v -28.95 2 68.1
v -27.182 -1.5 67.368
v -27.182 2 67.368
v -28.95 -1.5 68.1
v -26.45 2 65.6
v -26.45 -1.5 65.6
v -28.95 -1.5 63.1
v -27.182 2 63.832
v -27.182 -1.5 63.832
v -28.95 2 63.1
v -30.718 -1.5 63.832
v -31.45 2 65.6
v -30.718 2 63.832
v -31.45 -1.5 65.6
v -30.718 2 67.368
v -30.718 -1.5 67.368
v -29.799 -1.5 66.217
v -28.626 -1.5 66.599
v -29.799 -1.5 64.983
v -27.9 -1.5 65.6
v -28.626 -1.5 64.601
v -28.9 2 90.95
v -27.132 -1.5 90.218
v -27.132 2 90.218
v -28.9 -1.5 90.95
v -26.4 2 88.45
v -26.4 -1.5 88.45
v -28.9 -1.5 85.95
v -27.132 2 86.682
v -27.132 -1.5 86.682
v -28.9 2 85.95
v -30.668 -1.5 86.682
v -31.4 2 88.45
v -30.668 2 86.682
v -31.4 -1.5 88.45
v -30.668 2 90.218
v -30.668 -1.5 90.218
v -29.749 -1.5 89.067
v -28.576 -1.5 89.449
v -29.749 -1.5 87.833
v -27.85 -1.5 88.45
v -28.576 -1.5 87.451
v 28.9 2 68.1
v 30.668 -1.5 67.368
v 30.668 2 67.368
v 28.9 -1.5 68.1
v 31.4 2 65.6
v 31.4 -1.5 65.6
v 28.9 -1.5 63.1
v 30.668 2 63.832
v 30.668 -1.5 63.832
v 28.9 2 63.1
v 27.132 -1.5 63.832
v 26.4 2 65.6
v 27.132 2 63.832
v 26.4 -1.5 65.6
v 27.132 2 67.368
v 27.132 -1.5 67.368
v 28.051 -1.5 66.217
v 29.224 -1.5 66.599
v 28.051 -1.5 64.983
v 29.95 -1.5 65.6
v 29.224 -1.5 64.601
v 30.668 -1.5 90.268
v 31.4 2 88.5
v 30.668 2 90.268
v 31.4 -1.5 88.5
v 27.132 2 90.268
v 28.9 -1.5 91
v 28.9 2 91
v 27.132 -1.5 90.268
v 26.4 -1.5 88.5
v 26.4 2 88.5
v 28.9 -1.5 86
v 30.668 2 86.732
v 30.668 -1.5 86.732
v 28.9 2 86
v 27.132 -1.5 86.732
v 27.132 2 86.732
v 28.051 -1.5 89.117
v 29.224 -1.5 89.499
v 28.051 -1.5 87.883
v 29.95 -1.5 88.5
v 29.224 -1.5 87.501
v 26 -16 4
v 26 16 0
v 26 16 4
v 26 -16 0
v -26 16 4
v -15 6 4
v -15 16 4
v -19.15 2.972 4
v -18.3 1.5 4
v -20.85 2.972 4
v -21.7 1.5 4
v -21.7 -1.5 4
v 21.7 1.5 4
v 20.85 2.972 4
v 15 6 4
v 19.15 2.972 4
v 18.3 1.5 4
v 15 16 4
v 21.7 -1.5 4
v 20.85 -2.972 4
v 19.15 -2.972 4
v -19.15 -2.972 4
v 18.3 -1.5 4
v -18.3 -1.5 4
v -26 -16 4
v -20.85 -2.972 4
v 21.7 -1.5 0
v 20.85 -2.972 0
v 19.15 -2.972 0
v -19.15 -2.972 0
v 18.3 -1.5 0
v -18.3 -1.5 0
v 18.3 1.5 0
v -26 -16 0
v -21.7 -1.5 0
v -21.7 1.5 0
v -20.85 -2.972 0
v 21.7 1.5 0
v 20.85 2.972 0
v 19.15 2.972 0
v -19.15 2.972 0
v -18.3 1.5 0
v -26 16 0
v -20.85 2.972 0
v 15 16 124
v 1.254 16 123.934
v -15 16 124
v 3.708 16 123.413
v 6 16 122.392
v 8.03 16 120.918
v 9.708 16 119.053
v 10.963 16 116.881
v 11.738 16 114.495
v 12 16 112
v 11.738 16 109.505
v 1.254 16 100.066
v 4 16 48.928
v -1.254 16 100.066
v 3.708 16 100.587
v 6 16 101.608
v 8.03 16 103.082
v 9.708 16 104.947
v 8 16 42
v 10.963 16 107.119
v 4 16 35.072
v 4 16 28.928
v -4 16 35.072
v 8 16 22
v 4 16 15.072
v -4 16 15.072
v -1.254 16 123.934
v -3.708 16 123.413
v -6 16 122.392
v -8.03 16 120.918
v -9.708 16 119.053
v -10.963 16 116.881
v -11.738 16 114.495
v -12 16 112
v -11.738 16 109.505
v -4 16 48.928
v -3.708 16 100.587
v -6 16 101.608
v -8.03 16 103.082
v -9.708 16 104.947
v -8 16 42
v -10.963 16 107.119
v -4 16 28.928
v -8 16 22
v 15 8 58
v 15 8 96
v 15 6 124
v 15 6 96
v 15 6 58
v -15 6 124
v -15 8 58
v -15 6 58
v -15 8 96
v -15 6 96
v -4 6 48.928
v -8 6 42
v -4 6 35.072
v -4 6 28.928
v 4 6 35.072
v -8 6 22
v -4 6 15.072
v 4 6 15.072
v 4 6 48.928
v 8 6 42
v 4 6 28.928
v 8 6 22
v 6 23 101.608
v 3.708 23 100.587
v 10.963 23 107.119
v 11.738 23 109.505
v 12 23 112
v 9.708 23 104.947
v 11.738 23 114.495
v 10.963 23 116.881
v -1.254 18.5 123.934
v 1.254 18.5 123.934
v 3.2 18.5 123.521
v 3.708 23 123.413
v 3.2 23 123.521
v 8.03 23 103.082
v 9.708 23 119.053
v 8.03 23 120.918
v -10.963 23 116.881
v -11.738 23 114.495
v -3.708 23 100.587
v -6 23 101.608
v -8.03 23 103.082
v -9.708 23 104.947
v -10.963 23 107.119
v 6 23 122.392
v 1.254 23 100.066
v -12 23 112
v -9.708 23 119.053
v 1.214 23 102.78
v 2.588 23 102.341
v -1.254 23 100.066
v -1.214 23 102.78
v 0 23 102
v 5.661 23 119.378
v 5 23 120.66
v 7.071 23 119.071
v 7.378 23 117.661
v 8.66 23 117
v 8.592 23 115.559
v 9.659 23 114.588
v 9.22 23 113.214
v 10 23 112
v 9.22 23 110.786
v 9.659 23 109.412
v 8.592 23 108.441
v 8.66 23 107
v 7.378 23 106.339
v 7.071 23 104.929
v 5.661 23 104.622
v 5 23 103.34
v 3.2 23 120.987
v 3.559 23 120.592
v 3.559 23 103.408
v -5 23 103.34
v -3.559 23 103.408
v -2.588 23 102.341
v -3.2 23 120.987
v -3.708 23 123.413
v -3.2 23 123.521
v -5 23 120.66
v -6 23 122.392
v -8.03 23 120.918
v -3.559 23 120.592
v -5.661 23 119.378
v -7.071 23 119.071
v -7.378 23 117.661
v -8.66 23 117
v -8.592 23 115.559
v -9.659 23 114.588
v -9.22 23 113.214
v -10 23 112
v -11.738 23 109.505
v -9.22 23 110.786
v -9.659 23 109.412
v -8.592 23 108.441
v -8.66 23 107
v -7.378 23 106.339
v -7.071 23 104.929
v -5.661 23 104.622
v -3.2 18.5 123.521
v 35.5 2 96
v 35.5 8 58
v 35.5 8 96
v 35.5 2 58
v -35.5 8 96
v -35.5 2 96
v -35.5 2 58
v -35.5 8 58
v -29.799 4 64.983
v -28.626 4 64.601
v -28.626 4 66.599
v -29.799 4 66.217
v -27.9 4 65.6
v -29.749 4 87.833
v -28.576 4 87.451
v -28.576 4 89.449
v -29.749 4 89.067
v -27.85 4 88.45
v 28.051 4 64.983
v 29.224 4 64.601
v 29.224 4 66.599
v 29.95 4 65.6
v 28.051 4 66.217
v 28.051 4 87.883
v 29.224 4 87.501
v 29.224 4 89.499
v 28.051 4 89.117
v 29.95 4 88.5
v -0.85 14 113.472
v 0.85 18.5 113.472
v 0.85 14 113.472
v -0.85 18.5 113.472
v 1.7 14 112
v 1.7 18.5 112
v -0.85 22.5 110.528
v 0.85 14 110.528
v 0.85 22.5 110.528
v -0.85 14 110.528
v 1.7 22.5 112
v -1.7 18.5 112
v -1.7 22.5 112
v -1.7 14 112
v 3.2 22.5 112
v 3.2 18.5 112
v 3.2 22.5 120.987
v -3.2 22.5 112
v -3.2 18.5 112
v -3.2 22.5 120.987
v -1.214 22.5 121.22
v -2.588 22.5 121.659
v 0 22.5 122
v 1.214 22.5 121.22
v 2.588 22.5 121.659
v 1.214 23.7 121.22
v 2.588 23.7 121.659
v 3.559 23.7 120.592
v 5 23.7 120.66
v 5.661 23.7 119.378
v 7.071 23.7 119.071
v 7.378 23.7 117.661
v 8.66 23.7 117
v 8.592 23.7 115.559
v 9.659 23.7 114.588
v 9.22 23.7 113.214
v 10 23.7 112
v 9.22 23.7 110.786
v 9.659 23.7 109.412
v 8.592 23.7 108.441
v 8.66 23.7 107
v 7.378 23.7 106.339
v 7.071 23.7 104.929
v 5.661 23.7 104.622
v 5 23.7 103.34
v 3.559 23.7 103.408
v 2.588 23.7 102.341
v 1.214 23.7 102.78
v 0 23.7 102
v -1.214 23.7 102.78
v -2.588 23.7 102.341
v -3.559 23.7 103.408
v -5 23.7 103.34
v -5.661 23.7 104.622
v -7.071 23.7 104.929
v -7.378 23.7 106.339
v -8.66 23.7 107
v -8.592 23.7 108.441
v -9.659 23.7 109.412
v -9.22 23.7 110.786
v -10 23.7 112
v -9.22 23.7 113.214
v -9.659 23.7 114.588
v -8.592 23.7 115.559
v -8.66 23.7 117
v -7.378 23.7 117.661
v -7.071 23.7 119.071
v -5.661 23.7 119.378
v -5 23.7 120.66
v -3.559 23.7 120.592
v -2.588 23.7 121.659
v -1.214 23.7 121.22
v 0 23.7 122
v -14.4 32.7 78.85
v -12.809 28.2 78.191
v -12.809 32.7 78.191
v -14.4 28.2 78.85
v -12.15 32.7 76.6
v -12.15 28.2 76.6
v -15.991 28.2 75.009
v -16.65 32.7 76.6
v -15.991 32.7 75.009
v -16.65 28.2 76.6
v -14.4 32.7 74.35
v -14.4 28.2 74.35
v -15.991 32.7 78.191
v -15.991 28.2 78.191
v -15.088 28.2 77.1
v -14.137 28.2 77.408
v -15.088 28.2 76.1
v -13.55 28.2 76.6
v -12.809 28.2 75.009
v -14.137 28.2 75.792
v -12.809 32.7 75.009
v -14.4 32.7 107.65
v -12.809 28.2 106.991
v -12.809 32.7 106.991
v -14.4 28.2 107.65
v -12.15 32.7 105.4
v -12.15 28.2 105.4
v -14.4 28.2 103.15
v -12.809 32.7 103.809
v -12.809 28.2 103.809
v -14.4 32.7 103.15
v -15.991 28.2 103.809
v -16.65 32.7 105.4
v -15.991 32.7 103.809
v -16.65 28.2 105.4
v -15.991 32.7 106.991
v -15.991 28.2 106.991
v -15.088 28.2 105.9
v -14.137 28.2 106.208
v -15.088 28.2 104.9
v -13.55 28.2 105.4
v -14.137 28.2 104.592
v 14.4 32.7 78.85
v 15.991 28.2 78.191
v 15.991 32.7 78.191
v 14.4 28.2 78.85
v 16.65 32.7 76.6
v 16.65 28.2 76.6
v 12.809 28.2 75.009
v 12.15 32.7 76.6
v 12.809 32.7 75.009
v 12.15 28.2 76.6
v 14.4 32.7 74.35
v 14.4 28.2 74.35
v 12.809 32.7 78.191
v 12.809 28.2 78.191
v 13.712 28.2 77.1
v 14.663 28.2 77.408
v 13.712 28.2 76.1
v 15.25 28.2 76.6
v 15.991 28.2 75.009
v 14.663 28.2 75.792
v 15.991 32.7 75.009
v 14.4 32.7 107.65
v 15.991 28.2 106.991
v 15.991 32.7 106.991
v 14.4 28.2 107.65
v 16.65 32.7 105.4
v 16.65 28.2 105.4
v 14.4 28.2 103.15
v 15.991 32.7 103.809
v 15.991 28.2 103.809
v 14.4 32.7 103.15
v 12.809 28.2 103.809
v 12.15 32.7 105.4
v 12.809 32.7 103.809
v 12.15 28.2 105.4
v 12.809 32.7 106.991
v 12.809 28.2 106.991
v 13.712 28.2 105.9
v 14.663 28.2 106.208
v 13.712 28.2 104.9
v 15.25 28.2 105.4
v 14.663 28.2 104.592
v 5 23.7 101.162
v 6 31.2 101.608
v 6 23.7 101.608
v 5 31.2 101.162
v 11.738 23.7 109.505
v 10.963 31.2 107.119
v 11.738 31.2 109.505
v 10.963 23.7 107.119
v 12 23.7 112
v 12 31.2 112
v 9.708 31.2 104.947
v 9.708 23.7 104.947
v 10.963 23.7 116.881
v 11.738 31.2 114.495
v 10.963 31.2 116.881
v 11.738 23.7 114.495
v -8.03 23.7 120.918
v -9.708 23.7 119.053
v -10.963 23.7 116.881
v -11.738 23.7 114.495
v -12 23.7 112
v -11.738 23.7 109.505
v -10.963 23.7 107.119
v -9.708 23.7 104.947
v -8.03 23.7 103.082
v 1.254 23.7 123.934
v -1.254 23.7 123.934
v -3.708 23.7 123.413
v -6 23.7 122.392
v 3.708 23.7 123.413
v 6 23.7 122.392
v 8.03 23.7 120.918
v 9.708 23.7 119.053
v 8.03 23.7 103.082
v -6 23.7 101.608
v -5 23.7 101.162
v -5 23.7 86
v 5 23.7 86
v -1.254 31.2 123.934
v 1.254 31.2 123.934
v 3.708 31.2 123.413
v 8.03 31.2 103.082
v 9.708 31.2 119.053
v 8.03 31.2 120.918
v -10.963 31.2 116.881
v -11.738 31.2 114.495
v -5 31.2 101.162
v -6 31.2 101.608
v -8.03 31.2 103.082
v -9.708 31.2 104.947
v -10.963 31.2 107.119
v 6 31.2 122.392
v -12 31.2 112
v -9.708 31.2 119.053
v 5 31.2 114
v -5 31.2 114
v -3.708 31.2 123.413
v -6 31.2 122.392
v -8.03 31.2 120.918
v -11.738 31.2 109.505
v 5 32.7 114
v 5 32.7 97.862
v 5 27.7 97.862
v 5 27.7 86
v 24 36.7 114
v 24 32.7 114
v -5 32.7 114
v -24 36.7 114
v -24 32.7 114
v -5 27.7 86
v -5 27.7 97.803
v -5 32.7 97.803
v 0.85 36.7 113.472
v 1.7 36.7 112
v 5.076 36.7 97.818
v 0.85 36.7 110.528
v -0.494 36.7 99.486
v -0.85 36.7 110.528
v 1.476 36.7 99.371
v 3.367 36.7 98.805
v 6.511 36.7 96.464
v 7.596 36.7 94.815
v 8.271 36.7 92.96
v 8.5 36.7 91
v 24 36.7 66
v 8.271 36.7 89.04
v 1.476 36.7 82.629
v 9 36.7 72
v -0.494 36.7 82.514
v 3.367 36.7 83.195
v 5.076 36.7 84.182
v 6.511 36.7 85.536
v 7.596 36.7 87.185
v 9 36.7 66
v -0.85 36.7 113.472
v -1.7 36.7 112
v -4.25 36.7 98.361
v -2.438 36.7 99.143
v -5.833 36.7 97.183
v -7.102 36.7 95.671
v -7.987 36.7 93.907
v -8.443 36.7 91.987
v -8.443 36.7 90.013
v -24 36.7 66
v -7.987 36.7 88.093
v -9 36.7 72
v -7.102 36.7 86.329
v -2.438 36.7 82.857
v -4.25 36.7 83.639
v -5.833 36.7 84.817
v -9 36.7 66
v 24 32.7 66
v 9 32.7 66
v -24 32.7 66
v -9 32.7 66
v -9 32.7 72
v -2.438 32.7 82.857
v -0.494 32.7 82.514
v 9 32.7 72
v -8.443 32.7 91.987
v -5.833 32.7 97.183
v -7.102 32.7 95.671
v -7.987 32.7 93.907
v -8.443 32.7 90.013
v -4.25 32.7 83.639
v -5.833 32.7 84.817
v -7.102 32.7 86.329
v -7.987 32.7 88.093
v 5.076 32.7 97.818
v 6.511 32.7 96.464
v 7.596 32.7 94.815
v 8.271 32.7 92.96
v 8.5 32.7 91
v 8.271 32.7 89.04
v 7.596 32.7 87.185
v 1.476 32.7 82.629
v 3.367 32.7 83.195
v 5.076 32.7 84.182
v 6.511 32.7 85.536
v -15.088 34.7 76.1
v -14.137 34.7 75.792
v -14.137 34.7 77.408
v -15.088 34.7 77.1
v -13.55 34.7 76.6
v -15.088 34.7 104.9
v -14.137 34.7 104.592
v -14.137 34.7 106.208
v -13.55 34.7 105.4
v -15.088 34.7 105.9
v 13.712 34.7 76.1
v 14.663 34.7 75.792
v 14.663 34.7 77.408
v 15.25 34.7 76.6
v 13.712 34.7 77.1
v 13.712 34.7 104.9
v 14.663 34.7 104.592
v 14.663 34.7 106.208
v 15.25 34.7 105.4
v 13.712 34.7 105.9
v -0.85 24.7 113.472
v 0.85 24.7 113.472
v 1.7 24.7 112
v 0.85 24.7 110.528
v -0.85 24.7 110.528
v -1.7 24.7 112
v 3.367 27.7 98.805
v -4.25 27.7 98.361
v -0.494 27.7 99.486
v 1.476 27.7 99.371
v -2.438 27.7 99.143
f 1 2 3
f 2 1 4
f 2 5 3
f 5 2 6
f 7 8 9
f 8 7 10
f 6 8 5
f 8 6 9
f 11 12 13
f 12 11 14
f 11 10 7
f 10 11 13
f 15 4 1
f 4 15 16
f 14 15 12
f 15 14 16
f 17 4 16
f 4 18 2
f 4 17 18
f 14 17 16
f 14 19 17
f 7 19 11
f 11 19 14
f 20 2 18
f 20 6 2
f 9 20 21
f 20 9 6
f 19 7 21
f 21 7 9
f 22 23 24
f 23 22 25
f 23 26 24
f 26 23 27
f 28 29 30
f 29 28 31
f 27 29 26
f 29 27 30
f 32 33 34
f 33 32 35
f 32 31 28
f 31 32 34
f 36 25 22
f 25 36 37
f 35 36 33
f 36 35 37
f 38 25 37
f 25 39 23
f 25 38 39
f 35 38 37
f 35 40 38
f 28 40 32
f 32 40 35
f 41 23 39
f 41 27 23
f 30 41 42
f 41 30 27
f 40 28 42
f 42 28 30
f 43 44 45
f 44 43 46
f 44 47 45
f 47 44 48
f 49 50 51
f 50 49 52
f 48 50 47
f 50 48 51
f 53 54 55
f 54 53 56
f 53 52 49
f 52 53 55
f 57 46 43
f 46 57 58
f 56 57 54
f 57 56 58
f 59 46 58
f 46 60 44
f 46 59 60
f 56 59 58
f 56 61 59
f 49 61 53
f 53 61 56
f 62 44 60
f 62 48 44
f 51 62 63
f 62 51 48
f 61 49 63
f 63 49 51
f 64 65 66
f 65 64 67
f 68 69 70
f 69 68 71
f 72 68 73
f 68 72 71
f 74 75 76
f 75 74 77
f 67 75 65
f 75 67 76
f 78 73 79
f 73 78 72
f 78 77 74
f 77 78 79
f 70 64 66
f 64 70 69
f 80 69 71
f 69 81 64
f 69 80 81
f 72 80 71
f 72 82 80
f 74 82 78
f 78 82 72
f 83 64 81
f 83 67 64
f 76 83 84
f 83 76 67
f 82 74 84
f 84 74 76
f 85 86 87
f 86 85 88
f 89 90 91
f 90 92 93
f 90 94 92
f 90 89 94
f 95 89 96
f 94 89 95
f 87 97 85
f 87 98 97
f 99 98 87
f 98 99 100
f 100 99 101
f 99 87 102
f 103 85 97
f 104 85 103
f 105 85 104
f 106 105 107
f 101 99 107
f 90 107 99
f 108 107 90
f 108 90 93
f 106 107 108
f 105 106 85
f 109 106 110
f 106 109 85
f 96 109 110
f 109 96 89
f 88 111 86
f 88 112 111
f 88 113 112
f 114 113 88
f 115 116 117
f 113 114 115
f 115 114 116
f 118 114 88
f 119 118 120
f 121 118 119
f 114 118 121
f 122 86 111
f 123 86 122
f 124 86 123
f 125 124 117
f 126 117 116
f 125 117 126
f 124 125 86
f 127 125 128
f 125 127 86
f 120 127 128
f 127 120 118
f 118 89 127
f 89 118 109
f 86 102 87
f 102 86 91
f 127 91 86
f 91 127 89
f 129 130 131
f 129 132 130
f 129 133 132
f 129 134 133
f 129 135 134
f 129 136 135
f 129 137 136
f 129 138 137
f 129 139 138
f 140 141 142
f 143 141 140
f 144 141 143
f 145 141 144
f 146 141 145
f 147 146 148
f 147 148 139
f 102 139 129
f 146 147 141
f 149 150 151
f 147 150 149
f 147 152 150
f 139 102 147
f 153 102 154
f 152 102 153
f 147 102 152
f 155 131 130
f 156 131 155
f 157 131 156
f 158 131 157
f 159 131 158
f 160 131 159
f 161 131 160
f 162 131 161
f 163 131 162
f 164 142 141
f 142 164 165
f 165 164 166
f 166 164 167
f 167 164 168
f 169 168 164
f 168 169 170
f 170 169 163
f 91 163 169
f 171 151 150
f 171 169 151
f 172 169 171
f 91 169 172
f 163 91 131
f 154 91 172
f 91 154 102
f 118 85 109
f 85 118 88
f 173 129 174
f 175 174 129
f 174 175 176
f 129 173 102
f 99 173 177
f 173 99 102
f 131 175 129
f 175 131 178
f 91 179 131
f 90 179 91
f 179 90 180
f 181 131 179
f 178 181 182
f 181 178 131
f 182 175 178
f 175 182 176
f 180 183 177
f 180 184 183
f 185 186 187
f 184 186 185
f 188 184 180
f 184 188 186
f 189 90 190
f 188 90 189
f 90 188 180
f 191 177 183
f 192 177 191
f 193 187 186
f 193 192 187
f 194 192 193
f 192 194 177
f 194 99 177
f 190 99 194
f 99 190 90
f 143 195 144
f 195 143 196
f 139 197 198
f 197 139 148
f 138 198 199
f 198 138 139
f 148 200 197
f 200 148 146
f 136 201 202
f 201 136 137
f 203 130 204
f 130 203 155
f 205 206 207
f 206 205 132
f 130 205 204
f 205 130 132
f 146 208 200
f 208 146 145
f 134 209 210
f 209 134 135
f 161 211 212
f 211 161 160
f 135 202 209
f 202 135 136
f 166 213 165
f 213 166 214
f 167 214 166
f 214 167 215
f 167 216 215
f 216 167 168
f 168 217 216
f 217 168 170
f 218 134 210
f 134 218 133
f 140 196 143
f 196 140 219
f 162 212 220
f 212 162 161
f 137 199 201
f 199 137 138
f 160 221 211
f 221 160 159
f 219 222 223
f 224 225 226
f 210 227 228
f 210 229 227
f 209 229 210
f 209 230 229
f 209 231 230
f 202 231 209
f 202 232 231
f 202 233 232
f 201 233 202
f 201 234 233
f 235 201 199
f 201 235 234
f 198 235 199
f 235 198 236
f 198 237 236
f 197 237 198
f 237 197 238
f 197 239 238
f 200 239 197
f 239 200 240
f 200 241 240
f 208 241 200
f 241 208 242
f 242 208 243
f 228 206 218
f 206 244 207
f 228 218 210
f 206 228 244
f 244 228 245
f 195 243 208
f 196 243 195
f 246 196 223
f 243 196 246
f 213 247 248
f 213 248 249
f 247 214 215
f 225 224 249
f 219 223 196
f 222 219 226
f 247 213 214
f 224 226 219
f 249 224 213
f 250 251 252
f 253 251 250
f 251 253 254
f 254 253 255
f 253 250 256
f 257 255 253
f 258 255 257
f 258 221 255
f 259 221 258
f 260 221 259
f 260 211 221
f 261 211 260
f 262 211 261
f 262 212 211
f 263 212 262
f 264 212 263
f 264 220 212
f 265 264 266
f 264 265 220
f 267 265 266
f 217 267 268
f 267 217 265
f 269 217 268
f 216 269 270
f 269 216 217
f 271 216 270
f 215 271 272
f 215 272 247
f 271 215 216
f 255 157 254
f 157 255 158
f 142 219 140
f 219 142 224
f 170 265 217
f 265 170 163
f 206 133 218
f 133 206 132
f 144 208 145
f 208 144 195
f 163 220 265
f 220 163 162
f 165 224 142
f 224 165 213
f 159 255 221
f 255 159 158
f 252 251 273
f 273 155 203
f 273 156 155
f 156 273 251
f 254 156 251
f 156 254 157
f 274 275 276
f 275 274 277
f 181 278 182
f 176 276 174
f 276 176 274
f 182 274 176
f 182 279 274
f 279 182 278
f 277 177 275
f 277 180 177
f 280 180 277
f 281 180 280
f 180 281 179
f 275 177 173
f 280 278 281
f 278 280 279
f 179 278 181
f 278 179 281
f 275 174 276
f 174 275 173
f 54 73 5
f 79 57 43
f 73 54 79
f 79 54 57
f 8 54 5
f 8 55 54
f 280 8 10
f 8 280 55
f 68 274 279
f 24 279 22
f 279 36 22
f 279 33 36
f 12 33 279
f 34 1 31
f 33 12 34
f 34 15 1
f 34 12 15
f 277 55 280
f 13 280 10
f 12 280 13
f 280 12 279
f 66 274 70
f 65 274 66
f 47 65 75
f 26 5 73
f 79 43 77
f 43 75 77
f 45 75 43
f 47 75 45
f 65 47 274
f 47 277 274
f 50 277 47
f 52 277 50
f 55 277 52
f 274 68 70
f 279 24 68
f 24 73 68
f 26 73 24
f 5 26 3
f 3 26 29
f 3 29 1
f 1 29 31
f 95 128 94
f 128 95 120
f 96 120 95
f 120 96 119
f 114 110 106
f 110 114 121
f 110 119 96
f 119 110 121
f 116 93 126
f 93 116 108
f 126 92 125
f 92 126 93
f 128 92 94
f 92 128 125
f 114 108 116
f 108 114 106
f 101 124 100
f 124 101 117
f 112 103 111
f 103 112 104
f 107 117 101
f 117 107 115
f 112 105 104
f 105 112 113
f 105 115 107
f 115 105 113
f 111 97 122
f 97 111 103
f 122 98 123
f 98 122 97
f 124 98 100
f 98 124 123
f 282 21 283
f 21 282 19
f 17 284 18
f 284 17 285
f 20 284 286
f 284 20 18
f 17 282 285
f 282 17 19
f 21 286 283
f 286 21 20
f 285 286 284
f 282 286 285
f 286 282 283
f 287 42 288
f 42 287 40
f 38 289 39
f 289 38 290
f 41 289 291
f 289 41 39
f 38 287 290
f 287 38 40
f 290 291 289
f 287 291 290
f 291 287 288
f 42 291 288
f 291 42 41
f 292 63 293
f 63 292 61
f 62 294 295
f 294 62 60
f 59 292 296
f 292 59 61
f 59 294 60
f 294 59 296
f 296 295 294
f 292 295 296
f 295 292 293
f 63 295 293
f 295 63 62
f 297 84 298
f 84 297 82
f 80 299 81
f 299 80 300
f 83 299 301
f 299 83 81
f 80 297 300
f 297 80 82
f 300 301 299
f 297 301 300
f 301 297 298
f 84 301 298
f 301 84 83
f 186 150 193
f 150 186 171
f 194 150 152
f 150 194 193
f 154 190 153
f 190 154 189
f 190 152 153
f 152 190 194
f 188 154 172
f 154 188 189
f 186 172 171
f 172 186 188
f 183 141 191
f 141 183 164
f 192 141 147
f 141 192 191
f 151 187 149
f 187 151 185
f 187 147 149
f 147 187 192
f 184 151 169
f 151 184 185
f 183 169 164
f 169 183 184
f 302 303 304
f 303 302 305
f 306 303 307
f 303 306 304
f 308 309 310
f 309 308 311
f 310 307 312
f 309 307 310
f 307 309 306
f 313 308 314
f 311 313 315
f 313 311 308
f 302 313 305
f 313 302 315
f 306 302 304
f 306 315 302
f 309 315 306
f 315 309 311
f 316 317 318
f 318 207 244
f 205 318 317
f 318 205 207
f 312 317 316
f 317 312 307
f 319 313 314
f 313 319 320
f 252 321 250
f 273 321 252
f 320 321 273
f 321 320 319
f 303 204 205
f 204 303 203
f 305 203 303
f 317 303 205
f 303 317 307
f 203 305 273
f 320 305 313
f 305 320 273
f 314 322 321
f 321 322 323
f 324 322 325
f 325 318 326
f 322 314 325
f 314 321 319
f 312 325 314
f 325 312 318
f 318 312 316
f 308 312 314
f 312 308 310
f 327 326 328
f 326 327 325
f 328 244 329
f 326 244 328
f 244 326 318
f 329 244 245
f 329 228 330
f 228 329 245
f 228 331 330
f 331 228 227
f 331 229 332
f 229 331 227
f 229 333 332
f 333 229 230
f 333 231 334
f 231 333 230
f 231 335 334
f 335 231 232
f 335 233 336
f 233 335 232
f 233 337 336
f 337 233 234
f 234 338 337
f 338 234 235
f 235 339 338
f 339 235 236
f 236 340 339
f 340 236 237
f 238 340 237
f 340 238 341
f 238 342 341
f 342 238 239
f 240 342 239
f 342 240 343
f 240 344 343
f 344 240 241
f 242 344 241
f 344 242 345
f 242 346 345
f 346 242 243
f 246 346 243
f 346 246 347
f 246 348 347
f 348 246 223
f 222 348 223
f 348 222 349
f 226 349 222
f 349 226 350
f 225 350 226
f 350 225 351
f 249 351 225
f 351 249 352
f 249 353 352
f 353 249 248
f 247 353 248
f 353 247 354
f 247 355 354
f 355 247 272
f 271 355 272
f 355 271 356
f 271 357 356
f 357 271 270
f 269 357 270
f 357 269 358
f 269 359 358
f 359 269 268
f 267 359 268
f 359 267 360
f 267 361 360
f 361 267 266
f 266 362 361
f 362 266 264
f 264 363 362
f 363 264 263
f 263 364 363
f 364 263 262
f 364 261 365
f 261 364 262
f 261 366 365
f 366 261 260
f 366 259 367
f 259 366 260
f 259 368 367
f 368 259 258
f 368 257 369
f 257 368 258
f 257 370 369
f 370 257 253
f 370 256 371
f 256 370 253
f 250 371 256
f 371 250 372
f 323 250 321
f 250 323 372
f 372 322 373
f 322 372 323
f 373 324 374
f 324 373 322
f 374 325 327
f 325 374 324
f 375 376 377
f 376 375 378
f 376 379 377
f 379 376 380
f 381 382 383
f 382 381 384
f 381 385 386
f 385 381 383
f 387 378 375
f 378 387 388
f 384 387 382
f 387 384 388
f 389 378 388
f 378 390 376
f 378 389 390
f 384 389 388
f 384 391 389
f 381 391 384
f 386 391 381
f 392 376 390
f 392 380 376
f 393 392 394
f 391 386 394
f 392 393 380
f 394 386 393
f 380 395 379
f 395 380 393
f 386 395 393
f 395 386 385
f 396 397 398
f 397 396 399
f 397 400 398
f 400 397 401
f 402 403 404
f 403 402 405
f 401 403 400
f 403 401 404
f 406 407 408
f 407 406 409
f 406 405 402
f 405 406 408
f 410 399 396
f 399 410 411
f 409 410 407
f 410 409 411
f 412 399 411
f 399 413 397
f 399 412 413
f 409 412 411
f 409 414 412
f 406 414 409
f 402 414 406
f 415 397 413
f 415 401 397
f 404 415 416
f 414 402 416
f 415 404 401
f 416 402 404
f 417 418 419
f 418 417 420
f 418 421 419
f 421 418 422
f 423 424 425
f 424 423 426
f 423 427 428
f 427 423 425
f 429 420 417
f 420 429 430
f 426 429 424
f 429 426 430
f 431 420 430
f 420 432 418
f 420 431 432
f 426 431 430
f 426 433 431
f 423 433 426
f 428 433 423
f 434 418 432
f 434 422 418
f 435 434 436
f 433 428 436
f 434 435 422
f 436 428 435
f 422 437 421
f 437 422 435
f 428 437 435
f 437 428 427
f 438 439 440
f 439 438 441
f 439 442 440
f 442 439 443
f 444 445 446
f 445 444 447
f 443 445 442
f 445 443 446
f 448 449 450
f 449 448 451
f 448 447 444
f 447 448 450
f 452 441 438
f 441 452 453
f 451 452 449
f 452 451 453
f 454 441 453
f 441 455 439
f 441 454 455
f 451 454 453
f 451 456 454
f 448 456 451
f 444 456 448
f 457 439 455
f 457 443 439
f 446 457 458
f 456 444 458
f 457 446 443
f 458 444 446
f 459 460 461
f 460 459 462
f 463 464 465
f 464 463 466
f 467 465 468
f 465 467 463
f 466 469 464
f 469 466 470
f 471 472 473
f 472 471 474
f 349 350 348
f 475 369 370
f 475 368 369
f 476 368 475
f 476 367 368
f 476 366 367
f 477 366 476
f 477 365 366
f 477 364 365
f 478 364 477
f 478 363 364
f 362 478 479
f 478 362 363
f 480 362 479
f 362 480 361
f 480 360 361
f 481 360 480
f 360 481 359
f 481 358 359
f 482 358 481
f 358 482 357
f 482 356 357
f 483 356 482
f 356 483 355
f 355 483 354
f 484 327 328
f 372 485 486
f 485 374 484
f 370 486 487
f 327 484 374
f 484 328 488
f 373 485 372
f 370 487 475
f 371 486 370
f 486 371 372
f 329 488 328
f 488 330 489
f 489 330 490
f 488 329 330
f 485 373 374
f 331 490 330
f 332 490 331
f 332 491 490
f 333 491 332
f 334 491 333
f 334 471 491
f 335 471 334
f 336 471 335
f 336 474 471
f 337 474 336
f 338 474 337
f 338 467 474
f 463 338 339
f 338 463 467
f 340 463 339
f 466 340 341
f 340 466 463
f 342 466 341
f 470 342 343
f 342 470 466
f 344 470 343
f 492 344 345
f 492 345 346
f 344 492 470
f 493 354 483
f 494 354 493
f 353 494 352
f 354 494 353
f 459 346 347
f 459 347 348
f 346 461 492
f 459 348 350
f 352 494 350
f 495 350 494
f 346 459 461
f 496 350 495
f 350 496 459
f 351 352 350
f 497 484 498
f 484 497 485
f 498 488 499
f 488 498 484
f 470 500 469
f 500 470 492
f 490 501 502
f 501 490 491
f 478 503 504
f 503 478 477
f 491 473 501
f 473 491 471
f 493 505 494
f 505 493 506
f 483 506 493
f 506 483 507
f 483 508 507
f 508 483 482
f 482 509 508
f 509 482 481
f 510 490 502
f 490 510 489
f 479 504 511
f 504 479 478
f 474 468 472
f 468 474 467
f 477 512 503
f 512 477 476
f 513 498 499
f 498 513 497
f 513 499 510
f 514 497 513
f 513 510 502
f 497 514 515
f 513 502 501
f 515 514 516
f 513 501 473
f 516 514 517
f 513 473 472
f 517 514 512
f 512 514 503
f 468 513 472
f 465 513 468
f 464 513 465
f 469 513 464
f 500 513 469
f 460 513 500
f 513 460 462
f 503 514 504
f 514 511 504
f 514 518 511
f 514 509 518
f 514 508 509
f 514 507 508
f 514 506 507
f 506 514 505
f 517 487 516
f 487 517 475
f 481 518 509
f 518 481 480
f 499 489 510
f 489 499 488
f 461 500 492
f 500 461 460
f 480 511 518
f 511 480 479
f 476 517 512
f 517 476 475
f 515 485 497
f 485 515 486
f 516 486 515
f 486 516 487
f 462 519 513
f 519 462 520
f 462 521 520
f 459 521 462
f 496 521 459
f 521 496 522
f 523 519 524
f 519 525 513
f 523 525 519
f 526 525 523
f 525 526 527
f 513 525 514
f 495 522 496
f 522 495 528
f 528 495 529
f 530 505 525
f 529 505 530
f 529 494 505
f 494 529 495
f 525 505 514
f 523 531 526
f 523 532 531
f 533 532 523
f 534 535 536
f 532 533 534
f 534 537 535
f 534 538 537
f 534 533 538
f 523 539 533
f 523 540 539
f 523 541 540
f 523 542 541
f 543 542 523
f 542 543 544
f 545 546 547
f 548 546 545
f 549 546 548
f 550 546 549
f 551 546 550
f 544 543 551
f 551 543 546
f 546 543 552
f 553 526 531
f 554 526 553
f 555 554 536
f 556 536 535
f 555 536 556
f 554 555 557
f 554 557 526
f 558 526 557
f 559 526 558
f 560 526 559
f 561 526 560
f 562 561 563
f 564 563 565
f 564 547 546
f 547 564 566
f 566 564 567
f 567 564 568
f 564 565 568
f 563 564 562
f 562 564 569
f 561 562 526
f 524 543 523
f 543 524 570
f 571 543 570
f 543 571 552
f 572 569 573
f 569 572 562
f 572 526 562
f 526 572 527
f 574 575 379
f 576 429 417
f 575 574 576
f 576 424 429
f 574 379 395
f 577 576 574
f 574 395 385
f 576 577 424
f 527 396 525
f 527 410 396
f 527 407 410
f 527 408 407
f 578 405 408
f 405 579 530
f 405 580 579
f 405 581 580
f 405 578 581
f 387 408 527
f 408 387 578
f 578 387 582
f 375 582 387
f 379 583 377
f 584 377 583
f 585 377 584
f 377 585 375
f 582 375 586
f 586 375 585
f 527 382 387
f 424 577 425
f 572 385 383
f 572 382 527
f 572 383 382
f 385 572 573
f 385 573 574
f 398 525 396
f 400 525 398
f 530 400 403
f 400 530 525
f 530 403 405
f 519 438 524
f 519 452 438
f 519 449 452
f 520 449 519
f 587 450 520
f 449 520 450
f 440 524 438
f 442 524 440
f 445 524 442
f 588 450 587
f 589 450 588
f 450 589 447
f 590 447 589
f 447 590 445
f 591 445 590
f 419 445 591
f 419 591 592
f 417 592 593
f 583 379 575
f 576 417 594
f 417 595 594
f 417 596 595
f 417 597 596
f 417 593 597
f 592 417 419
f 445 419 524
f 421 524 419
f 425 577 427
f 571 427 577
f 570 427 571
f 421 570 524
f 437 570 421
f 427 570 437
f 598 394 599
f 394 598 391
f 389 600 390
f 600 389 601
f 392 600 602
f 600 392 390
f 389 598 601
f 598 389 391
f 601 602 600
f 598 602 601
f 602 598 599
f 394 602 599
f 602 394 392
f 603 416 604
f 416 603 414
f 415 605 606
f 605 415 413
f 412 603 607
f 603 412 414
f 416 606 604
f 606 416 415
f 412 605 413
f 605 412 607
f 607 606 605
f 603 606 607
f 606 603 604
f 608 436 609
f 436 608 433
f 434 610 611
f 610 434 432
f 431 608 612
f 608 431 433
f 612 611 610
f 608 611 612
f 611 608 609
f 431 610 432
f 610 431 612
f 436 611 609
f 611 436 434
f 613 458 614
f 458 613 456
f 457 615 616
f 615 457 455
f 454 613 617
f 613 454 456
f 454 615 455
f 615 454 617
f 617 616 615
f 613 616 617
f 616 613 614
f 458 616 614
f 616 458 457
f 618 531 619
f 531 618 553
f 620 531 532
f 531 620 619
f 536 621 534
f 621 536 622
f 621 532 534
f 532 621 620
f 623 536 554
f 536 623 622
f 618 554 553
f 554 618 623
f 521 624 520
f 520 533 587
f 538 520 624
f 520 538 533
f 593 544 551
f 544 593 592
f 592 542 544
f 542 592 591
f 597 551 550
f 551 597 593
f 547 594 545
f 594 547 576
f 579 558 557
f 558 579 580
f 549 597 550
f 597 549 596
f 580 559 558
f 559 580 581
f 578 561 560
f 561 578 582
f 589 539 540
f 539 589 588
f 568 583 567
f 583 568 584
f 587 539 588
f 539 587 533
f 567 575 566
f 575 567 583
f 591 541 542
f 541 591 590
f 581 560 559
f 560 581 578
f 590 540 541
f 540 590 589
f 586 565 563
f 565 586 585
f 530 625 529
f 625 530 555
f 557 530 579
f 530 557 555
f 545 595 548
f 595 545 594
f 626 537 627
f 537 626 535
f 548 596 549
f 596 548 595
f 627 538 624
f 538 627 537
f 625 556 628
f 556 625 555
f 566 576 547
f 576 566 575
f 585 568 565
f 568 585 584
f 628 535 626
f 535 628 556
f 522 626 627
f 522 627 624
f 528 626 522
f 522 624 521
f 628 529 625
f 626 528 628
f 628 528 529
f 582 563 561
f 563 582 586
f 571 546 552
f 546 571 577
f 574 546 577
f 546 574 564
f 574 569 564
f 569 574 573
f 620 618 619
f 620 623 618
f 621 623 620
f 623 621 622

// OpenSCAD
// Sentinel — Zero 3W + Arducam 36x36 mount for Ender-3 V3 SE
// Mounts to Y-axis wheel cover (2 screws, reuses cover threads).
// Concept credit: bioxz "Ender-3 V3 SE Pi Zero & Camera Mount" (CC BY-SA).
// Geometry: Radxa v1.11 DXF (board) + measured camera (36x36, 28.8 grid).
//
// Coordinates: +Y = toward printer bed. Shoe sits on wheel cover at origin.
// part = "frame" | "arm" | "preview"

part = "preview"; // [frame, arm, preview]

/* [Wheel cover interface — MEASURED ON PRINTER] */
screw_spacing = 40.0;   // MEASURED 2026-08-16   // center-to-center of the 2 cover screws (X)
cover_w       = 44.0;   // cover top width  (X, left-right)
cover_d       = 24.0;   // cover top depth  (Y, front-back)

/* [Hardware] */
m3_clear   = 3.4;    // M3 clearance
m3_nut_d   = 7.4;    // M3 nut across-corners + clearance (hex pocket)
cam_pilot  = 1.7;    // M2 self-tap pilot (camera posts)
z3w_pilot  = 2.1;    // M2.5 self-tap pilot (Hive-proven)

/* [Zero 3W — Radxa v1.11 DXF] */
z3w_x = 65.0; z3w_y = 30.0;
z3w_holes = [[3.55,3.60],[3.60,26.45],[61.40,3.60],[61.40,26.50]];

/* [Camera — measured] */
cam_grid = 28.8; lens_d = 17.0;   // 36x36 board, 28.8 hole grid

/* [Structure] */
shoe_t  = 4.0;
spine_w = 30.0;
spine_d = 10.0;
spine_h = 112.0;   // shoe bottom -> hub center
hub_d   = 24.0;
hub_t   = 7.0;
serr_d  = 20.0; serr_n = 24; serr_amp = 0.7; serr_h = 1.2;
plate_t = 4.0;

spine_y0 = cover_d/2 + 4 - spine_d;           // spine front (-Y) face
hub_y1   = spine_y0 + spine_d + hub_t;        // hub +Y face (serration side)
board_z0 = 62.0;                              // board bottom edge on cradle

// ---------------------------------------------------------------
module serration_ring(d, n, amp, h) {
    pts = [for (i = [0 : 2*n - 1])
        let(a = 360*i/(2*n), r = (i % 2 == 0) ? d/2 : d/2 - amp)
        [r*cos(a), r*sin(a)]];
    linear_extrude(h) polygon(pts);
}

// ---------------------------------------------------------------
module frame() {
    difference() {
        union() {
            translate([-cover_w/2 - 4, -cover_d/2 - 4, 0])
                cube([cover_w + 8, cover_d + 8, shoe_t]);       // shoe
            translate([-spine_w/2, spine_y0, 0])
                cube([spine_w, spine_d, spine_h + hub_d/2]);    // spine
            translate([0, spine_y0 + spine_d - 1, spine_h])
                rotate([-90, 0, 0])
                    cylinder(d = hub_d, h = hub_t + 1);         // hub (+Y)
            translate([-z3w_x/2 - 3, spine_y0 - plate_t, board_z0 - 4])
                cube([z3w_x + 6, plate_t + 2, z3w_y + 8]);      // cradle plate (2mm into spine)
            for (hxy = z3w_holes)                               // bosses
                translate([hxy[0] - z3w_x/2, spine_y0 - plate_t + 1,
                           board_z0 + hxy[1]])
                    rotate([90, 0, 0]) cylinder(d = 5, h = 4.5);
        }
        for (sx = [-screw_spacing/2, screw_spacing/2])          // shoe slots
            translate([sx, 0, -1]) hull() {
                translate([0, -1.5, 0]) cylinder(d = m3_clear, h = shoe_t + 2);
                translate([0,  1.5, 0]) cylinder(d = m3_clear, h = shoe_t + 2);
            }
        for (hxy = z3w_holes)                                   // boss pilots
            translate([hxy[0] - z3w_x/2, spine_y0 - plate_t + 2,
                       board_z0 + hxy[1]])
                rotate([90, 0, 0]) cylinder(d = z3w_pilot, h = 6);
        translate([0, spine_y0 + spine_d - 2, spine_h])         // hub bore
            rotate([-90, 0, 0]) cylinder(d = m3_clear, h = hub_t + 4);
        translate([-3.2, hub_y1 - 4.5, spine_h])                // top-entry nut slot
            cube([6.4, 4.5, hub_d/2 + 1]);
        for (z = [22 : 20 : 42])                                // lightening
            translate([0, spine_y0 - 1, z])
                rotate([-90, 0, 0]) cylinder(d = 16, h = spine_d + 2, $fn = 6);
    }
    translate([0, hub_y1 - 0.5, spine_h])                       // serrations
        rotate([-90, 0, 0]) serration_ring(serr_d, serr_n, serr_amp, serr_h + 0.5);
}

// ---------------------------------------------------------------
// ARM — modeled ASSEMBLED (same axes as frame). Plate hangs below hub,
// faces +Y (bed). Tilt about the M3 axle, serration-locked.
// ---------------------------------------------------------------
boss_y  = hub_y1 + serr_h - 0.5;            // arm boss -Y start (ring sinks in)
plate_y = boss_y + hub_t + 2;               // camera plate -Y face
cam_zc  = spine_h - 21;                     // camera board center height

module arm_assembled() {
    difference() {
        union() {
            translate([0, boss_y, spine_h])                   // boss
                rotate([-90, 0, 0]) cylinder(d = hub_d, h = hub_t + 0.5);
            translate([-5, boss_y, spine_h - 26])             // web to plate
                cube([10, plate_y - boss_y + plate_t, 28]);
            translate([-24, plate_y, spine_h - 46])           // camera plate
                cube([48, plate_t, 48]);
            for (sx = [-cam_grid/2, cam_grid/2], sz = [-cam_grid/2, cam_grid/2])
                translate([sx, plate_y + 1, cam_zc + sz])     // posts (-Y face)
                    rotate([90, 0, 0]) cylinder(d = 4.5, h = 5.5);
        }
        translate([0, boss_y - 1, spine_h])                   // M3 through-bore
            rotate([-90, 0, 0]) cylinder(d = m3_clear, h = hub_t + plate_t + 12);
        translate([0, plate_y - 5, cam_zc])                   // lens hole
            rotate([-90, 0, 0]) cylinder(d = lens_d, h = plate_t + 10);
        for (sx = [-cam_grid/2, cam_grid/2], sz = [-cam_grid/2, cam_grid/2])
            translate([sx, plate_y + 2, cam_zc + sz])         // post pilots
                rotate([90, 0, 0]) cylinder(d = cam_pilot, h = 7);
        translate([-9, plate_y - 1, spine_h - 48])            // ribbon slot
            cube([18, plate_t + 2, 8]);
    }
    translate([0, boss_y - serr_h + 0.5, spine_h])            // serrations
        rotate([-90, 0, 0]) serration_ring(serr_d, serr_n, serr_amp, serr_h + 0.5);
}

// print orientation: rotX(-90) maps Y->-Z; plate +Y face becomes build-plate
// side, posts point up, serrations end up on TOP. Shift so min z = 0.
arm_lift = plate_y + plate_t;   // max y in assembled coords -> becomes -z

module arm() {
    translate([0, 0, arm_lift]) rotate([-90, 0, 0]) arm_assembled();
}

// ---------------------------------------------------------------
if (part == "frame") frame();
if (part == "arm")   arm();
if (part == "preview") {
    color([0.1, 0.1, 0.11]) frame();
    color([0.95, 0.95, 0.93]) arm_assembled();
}
